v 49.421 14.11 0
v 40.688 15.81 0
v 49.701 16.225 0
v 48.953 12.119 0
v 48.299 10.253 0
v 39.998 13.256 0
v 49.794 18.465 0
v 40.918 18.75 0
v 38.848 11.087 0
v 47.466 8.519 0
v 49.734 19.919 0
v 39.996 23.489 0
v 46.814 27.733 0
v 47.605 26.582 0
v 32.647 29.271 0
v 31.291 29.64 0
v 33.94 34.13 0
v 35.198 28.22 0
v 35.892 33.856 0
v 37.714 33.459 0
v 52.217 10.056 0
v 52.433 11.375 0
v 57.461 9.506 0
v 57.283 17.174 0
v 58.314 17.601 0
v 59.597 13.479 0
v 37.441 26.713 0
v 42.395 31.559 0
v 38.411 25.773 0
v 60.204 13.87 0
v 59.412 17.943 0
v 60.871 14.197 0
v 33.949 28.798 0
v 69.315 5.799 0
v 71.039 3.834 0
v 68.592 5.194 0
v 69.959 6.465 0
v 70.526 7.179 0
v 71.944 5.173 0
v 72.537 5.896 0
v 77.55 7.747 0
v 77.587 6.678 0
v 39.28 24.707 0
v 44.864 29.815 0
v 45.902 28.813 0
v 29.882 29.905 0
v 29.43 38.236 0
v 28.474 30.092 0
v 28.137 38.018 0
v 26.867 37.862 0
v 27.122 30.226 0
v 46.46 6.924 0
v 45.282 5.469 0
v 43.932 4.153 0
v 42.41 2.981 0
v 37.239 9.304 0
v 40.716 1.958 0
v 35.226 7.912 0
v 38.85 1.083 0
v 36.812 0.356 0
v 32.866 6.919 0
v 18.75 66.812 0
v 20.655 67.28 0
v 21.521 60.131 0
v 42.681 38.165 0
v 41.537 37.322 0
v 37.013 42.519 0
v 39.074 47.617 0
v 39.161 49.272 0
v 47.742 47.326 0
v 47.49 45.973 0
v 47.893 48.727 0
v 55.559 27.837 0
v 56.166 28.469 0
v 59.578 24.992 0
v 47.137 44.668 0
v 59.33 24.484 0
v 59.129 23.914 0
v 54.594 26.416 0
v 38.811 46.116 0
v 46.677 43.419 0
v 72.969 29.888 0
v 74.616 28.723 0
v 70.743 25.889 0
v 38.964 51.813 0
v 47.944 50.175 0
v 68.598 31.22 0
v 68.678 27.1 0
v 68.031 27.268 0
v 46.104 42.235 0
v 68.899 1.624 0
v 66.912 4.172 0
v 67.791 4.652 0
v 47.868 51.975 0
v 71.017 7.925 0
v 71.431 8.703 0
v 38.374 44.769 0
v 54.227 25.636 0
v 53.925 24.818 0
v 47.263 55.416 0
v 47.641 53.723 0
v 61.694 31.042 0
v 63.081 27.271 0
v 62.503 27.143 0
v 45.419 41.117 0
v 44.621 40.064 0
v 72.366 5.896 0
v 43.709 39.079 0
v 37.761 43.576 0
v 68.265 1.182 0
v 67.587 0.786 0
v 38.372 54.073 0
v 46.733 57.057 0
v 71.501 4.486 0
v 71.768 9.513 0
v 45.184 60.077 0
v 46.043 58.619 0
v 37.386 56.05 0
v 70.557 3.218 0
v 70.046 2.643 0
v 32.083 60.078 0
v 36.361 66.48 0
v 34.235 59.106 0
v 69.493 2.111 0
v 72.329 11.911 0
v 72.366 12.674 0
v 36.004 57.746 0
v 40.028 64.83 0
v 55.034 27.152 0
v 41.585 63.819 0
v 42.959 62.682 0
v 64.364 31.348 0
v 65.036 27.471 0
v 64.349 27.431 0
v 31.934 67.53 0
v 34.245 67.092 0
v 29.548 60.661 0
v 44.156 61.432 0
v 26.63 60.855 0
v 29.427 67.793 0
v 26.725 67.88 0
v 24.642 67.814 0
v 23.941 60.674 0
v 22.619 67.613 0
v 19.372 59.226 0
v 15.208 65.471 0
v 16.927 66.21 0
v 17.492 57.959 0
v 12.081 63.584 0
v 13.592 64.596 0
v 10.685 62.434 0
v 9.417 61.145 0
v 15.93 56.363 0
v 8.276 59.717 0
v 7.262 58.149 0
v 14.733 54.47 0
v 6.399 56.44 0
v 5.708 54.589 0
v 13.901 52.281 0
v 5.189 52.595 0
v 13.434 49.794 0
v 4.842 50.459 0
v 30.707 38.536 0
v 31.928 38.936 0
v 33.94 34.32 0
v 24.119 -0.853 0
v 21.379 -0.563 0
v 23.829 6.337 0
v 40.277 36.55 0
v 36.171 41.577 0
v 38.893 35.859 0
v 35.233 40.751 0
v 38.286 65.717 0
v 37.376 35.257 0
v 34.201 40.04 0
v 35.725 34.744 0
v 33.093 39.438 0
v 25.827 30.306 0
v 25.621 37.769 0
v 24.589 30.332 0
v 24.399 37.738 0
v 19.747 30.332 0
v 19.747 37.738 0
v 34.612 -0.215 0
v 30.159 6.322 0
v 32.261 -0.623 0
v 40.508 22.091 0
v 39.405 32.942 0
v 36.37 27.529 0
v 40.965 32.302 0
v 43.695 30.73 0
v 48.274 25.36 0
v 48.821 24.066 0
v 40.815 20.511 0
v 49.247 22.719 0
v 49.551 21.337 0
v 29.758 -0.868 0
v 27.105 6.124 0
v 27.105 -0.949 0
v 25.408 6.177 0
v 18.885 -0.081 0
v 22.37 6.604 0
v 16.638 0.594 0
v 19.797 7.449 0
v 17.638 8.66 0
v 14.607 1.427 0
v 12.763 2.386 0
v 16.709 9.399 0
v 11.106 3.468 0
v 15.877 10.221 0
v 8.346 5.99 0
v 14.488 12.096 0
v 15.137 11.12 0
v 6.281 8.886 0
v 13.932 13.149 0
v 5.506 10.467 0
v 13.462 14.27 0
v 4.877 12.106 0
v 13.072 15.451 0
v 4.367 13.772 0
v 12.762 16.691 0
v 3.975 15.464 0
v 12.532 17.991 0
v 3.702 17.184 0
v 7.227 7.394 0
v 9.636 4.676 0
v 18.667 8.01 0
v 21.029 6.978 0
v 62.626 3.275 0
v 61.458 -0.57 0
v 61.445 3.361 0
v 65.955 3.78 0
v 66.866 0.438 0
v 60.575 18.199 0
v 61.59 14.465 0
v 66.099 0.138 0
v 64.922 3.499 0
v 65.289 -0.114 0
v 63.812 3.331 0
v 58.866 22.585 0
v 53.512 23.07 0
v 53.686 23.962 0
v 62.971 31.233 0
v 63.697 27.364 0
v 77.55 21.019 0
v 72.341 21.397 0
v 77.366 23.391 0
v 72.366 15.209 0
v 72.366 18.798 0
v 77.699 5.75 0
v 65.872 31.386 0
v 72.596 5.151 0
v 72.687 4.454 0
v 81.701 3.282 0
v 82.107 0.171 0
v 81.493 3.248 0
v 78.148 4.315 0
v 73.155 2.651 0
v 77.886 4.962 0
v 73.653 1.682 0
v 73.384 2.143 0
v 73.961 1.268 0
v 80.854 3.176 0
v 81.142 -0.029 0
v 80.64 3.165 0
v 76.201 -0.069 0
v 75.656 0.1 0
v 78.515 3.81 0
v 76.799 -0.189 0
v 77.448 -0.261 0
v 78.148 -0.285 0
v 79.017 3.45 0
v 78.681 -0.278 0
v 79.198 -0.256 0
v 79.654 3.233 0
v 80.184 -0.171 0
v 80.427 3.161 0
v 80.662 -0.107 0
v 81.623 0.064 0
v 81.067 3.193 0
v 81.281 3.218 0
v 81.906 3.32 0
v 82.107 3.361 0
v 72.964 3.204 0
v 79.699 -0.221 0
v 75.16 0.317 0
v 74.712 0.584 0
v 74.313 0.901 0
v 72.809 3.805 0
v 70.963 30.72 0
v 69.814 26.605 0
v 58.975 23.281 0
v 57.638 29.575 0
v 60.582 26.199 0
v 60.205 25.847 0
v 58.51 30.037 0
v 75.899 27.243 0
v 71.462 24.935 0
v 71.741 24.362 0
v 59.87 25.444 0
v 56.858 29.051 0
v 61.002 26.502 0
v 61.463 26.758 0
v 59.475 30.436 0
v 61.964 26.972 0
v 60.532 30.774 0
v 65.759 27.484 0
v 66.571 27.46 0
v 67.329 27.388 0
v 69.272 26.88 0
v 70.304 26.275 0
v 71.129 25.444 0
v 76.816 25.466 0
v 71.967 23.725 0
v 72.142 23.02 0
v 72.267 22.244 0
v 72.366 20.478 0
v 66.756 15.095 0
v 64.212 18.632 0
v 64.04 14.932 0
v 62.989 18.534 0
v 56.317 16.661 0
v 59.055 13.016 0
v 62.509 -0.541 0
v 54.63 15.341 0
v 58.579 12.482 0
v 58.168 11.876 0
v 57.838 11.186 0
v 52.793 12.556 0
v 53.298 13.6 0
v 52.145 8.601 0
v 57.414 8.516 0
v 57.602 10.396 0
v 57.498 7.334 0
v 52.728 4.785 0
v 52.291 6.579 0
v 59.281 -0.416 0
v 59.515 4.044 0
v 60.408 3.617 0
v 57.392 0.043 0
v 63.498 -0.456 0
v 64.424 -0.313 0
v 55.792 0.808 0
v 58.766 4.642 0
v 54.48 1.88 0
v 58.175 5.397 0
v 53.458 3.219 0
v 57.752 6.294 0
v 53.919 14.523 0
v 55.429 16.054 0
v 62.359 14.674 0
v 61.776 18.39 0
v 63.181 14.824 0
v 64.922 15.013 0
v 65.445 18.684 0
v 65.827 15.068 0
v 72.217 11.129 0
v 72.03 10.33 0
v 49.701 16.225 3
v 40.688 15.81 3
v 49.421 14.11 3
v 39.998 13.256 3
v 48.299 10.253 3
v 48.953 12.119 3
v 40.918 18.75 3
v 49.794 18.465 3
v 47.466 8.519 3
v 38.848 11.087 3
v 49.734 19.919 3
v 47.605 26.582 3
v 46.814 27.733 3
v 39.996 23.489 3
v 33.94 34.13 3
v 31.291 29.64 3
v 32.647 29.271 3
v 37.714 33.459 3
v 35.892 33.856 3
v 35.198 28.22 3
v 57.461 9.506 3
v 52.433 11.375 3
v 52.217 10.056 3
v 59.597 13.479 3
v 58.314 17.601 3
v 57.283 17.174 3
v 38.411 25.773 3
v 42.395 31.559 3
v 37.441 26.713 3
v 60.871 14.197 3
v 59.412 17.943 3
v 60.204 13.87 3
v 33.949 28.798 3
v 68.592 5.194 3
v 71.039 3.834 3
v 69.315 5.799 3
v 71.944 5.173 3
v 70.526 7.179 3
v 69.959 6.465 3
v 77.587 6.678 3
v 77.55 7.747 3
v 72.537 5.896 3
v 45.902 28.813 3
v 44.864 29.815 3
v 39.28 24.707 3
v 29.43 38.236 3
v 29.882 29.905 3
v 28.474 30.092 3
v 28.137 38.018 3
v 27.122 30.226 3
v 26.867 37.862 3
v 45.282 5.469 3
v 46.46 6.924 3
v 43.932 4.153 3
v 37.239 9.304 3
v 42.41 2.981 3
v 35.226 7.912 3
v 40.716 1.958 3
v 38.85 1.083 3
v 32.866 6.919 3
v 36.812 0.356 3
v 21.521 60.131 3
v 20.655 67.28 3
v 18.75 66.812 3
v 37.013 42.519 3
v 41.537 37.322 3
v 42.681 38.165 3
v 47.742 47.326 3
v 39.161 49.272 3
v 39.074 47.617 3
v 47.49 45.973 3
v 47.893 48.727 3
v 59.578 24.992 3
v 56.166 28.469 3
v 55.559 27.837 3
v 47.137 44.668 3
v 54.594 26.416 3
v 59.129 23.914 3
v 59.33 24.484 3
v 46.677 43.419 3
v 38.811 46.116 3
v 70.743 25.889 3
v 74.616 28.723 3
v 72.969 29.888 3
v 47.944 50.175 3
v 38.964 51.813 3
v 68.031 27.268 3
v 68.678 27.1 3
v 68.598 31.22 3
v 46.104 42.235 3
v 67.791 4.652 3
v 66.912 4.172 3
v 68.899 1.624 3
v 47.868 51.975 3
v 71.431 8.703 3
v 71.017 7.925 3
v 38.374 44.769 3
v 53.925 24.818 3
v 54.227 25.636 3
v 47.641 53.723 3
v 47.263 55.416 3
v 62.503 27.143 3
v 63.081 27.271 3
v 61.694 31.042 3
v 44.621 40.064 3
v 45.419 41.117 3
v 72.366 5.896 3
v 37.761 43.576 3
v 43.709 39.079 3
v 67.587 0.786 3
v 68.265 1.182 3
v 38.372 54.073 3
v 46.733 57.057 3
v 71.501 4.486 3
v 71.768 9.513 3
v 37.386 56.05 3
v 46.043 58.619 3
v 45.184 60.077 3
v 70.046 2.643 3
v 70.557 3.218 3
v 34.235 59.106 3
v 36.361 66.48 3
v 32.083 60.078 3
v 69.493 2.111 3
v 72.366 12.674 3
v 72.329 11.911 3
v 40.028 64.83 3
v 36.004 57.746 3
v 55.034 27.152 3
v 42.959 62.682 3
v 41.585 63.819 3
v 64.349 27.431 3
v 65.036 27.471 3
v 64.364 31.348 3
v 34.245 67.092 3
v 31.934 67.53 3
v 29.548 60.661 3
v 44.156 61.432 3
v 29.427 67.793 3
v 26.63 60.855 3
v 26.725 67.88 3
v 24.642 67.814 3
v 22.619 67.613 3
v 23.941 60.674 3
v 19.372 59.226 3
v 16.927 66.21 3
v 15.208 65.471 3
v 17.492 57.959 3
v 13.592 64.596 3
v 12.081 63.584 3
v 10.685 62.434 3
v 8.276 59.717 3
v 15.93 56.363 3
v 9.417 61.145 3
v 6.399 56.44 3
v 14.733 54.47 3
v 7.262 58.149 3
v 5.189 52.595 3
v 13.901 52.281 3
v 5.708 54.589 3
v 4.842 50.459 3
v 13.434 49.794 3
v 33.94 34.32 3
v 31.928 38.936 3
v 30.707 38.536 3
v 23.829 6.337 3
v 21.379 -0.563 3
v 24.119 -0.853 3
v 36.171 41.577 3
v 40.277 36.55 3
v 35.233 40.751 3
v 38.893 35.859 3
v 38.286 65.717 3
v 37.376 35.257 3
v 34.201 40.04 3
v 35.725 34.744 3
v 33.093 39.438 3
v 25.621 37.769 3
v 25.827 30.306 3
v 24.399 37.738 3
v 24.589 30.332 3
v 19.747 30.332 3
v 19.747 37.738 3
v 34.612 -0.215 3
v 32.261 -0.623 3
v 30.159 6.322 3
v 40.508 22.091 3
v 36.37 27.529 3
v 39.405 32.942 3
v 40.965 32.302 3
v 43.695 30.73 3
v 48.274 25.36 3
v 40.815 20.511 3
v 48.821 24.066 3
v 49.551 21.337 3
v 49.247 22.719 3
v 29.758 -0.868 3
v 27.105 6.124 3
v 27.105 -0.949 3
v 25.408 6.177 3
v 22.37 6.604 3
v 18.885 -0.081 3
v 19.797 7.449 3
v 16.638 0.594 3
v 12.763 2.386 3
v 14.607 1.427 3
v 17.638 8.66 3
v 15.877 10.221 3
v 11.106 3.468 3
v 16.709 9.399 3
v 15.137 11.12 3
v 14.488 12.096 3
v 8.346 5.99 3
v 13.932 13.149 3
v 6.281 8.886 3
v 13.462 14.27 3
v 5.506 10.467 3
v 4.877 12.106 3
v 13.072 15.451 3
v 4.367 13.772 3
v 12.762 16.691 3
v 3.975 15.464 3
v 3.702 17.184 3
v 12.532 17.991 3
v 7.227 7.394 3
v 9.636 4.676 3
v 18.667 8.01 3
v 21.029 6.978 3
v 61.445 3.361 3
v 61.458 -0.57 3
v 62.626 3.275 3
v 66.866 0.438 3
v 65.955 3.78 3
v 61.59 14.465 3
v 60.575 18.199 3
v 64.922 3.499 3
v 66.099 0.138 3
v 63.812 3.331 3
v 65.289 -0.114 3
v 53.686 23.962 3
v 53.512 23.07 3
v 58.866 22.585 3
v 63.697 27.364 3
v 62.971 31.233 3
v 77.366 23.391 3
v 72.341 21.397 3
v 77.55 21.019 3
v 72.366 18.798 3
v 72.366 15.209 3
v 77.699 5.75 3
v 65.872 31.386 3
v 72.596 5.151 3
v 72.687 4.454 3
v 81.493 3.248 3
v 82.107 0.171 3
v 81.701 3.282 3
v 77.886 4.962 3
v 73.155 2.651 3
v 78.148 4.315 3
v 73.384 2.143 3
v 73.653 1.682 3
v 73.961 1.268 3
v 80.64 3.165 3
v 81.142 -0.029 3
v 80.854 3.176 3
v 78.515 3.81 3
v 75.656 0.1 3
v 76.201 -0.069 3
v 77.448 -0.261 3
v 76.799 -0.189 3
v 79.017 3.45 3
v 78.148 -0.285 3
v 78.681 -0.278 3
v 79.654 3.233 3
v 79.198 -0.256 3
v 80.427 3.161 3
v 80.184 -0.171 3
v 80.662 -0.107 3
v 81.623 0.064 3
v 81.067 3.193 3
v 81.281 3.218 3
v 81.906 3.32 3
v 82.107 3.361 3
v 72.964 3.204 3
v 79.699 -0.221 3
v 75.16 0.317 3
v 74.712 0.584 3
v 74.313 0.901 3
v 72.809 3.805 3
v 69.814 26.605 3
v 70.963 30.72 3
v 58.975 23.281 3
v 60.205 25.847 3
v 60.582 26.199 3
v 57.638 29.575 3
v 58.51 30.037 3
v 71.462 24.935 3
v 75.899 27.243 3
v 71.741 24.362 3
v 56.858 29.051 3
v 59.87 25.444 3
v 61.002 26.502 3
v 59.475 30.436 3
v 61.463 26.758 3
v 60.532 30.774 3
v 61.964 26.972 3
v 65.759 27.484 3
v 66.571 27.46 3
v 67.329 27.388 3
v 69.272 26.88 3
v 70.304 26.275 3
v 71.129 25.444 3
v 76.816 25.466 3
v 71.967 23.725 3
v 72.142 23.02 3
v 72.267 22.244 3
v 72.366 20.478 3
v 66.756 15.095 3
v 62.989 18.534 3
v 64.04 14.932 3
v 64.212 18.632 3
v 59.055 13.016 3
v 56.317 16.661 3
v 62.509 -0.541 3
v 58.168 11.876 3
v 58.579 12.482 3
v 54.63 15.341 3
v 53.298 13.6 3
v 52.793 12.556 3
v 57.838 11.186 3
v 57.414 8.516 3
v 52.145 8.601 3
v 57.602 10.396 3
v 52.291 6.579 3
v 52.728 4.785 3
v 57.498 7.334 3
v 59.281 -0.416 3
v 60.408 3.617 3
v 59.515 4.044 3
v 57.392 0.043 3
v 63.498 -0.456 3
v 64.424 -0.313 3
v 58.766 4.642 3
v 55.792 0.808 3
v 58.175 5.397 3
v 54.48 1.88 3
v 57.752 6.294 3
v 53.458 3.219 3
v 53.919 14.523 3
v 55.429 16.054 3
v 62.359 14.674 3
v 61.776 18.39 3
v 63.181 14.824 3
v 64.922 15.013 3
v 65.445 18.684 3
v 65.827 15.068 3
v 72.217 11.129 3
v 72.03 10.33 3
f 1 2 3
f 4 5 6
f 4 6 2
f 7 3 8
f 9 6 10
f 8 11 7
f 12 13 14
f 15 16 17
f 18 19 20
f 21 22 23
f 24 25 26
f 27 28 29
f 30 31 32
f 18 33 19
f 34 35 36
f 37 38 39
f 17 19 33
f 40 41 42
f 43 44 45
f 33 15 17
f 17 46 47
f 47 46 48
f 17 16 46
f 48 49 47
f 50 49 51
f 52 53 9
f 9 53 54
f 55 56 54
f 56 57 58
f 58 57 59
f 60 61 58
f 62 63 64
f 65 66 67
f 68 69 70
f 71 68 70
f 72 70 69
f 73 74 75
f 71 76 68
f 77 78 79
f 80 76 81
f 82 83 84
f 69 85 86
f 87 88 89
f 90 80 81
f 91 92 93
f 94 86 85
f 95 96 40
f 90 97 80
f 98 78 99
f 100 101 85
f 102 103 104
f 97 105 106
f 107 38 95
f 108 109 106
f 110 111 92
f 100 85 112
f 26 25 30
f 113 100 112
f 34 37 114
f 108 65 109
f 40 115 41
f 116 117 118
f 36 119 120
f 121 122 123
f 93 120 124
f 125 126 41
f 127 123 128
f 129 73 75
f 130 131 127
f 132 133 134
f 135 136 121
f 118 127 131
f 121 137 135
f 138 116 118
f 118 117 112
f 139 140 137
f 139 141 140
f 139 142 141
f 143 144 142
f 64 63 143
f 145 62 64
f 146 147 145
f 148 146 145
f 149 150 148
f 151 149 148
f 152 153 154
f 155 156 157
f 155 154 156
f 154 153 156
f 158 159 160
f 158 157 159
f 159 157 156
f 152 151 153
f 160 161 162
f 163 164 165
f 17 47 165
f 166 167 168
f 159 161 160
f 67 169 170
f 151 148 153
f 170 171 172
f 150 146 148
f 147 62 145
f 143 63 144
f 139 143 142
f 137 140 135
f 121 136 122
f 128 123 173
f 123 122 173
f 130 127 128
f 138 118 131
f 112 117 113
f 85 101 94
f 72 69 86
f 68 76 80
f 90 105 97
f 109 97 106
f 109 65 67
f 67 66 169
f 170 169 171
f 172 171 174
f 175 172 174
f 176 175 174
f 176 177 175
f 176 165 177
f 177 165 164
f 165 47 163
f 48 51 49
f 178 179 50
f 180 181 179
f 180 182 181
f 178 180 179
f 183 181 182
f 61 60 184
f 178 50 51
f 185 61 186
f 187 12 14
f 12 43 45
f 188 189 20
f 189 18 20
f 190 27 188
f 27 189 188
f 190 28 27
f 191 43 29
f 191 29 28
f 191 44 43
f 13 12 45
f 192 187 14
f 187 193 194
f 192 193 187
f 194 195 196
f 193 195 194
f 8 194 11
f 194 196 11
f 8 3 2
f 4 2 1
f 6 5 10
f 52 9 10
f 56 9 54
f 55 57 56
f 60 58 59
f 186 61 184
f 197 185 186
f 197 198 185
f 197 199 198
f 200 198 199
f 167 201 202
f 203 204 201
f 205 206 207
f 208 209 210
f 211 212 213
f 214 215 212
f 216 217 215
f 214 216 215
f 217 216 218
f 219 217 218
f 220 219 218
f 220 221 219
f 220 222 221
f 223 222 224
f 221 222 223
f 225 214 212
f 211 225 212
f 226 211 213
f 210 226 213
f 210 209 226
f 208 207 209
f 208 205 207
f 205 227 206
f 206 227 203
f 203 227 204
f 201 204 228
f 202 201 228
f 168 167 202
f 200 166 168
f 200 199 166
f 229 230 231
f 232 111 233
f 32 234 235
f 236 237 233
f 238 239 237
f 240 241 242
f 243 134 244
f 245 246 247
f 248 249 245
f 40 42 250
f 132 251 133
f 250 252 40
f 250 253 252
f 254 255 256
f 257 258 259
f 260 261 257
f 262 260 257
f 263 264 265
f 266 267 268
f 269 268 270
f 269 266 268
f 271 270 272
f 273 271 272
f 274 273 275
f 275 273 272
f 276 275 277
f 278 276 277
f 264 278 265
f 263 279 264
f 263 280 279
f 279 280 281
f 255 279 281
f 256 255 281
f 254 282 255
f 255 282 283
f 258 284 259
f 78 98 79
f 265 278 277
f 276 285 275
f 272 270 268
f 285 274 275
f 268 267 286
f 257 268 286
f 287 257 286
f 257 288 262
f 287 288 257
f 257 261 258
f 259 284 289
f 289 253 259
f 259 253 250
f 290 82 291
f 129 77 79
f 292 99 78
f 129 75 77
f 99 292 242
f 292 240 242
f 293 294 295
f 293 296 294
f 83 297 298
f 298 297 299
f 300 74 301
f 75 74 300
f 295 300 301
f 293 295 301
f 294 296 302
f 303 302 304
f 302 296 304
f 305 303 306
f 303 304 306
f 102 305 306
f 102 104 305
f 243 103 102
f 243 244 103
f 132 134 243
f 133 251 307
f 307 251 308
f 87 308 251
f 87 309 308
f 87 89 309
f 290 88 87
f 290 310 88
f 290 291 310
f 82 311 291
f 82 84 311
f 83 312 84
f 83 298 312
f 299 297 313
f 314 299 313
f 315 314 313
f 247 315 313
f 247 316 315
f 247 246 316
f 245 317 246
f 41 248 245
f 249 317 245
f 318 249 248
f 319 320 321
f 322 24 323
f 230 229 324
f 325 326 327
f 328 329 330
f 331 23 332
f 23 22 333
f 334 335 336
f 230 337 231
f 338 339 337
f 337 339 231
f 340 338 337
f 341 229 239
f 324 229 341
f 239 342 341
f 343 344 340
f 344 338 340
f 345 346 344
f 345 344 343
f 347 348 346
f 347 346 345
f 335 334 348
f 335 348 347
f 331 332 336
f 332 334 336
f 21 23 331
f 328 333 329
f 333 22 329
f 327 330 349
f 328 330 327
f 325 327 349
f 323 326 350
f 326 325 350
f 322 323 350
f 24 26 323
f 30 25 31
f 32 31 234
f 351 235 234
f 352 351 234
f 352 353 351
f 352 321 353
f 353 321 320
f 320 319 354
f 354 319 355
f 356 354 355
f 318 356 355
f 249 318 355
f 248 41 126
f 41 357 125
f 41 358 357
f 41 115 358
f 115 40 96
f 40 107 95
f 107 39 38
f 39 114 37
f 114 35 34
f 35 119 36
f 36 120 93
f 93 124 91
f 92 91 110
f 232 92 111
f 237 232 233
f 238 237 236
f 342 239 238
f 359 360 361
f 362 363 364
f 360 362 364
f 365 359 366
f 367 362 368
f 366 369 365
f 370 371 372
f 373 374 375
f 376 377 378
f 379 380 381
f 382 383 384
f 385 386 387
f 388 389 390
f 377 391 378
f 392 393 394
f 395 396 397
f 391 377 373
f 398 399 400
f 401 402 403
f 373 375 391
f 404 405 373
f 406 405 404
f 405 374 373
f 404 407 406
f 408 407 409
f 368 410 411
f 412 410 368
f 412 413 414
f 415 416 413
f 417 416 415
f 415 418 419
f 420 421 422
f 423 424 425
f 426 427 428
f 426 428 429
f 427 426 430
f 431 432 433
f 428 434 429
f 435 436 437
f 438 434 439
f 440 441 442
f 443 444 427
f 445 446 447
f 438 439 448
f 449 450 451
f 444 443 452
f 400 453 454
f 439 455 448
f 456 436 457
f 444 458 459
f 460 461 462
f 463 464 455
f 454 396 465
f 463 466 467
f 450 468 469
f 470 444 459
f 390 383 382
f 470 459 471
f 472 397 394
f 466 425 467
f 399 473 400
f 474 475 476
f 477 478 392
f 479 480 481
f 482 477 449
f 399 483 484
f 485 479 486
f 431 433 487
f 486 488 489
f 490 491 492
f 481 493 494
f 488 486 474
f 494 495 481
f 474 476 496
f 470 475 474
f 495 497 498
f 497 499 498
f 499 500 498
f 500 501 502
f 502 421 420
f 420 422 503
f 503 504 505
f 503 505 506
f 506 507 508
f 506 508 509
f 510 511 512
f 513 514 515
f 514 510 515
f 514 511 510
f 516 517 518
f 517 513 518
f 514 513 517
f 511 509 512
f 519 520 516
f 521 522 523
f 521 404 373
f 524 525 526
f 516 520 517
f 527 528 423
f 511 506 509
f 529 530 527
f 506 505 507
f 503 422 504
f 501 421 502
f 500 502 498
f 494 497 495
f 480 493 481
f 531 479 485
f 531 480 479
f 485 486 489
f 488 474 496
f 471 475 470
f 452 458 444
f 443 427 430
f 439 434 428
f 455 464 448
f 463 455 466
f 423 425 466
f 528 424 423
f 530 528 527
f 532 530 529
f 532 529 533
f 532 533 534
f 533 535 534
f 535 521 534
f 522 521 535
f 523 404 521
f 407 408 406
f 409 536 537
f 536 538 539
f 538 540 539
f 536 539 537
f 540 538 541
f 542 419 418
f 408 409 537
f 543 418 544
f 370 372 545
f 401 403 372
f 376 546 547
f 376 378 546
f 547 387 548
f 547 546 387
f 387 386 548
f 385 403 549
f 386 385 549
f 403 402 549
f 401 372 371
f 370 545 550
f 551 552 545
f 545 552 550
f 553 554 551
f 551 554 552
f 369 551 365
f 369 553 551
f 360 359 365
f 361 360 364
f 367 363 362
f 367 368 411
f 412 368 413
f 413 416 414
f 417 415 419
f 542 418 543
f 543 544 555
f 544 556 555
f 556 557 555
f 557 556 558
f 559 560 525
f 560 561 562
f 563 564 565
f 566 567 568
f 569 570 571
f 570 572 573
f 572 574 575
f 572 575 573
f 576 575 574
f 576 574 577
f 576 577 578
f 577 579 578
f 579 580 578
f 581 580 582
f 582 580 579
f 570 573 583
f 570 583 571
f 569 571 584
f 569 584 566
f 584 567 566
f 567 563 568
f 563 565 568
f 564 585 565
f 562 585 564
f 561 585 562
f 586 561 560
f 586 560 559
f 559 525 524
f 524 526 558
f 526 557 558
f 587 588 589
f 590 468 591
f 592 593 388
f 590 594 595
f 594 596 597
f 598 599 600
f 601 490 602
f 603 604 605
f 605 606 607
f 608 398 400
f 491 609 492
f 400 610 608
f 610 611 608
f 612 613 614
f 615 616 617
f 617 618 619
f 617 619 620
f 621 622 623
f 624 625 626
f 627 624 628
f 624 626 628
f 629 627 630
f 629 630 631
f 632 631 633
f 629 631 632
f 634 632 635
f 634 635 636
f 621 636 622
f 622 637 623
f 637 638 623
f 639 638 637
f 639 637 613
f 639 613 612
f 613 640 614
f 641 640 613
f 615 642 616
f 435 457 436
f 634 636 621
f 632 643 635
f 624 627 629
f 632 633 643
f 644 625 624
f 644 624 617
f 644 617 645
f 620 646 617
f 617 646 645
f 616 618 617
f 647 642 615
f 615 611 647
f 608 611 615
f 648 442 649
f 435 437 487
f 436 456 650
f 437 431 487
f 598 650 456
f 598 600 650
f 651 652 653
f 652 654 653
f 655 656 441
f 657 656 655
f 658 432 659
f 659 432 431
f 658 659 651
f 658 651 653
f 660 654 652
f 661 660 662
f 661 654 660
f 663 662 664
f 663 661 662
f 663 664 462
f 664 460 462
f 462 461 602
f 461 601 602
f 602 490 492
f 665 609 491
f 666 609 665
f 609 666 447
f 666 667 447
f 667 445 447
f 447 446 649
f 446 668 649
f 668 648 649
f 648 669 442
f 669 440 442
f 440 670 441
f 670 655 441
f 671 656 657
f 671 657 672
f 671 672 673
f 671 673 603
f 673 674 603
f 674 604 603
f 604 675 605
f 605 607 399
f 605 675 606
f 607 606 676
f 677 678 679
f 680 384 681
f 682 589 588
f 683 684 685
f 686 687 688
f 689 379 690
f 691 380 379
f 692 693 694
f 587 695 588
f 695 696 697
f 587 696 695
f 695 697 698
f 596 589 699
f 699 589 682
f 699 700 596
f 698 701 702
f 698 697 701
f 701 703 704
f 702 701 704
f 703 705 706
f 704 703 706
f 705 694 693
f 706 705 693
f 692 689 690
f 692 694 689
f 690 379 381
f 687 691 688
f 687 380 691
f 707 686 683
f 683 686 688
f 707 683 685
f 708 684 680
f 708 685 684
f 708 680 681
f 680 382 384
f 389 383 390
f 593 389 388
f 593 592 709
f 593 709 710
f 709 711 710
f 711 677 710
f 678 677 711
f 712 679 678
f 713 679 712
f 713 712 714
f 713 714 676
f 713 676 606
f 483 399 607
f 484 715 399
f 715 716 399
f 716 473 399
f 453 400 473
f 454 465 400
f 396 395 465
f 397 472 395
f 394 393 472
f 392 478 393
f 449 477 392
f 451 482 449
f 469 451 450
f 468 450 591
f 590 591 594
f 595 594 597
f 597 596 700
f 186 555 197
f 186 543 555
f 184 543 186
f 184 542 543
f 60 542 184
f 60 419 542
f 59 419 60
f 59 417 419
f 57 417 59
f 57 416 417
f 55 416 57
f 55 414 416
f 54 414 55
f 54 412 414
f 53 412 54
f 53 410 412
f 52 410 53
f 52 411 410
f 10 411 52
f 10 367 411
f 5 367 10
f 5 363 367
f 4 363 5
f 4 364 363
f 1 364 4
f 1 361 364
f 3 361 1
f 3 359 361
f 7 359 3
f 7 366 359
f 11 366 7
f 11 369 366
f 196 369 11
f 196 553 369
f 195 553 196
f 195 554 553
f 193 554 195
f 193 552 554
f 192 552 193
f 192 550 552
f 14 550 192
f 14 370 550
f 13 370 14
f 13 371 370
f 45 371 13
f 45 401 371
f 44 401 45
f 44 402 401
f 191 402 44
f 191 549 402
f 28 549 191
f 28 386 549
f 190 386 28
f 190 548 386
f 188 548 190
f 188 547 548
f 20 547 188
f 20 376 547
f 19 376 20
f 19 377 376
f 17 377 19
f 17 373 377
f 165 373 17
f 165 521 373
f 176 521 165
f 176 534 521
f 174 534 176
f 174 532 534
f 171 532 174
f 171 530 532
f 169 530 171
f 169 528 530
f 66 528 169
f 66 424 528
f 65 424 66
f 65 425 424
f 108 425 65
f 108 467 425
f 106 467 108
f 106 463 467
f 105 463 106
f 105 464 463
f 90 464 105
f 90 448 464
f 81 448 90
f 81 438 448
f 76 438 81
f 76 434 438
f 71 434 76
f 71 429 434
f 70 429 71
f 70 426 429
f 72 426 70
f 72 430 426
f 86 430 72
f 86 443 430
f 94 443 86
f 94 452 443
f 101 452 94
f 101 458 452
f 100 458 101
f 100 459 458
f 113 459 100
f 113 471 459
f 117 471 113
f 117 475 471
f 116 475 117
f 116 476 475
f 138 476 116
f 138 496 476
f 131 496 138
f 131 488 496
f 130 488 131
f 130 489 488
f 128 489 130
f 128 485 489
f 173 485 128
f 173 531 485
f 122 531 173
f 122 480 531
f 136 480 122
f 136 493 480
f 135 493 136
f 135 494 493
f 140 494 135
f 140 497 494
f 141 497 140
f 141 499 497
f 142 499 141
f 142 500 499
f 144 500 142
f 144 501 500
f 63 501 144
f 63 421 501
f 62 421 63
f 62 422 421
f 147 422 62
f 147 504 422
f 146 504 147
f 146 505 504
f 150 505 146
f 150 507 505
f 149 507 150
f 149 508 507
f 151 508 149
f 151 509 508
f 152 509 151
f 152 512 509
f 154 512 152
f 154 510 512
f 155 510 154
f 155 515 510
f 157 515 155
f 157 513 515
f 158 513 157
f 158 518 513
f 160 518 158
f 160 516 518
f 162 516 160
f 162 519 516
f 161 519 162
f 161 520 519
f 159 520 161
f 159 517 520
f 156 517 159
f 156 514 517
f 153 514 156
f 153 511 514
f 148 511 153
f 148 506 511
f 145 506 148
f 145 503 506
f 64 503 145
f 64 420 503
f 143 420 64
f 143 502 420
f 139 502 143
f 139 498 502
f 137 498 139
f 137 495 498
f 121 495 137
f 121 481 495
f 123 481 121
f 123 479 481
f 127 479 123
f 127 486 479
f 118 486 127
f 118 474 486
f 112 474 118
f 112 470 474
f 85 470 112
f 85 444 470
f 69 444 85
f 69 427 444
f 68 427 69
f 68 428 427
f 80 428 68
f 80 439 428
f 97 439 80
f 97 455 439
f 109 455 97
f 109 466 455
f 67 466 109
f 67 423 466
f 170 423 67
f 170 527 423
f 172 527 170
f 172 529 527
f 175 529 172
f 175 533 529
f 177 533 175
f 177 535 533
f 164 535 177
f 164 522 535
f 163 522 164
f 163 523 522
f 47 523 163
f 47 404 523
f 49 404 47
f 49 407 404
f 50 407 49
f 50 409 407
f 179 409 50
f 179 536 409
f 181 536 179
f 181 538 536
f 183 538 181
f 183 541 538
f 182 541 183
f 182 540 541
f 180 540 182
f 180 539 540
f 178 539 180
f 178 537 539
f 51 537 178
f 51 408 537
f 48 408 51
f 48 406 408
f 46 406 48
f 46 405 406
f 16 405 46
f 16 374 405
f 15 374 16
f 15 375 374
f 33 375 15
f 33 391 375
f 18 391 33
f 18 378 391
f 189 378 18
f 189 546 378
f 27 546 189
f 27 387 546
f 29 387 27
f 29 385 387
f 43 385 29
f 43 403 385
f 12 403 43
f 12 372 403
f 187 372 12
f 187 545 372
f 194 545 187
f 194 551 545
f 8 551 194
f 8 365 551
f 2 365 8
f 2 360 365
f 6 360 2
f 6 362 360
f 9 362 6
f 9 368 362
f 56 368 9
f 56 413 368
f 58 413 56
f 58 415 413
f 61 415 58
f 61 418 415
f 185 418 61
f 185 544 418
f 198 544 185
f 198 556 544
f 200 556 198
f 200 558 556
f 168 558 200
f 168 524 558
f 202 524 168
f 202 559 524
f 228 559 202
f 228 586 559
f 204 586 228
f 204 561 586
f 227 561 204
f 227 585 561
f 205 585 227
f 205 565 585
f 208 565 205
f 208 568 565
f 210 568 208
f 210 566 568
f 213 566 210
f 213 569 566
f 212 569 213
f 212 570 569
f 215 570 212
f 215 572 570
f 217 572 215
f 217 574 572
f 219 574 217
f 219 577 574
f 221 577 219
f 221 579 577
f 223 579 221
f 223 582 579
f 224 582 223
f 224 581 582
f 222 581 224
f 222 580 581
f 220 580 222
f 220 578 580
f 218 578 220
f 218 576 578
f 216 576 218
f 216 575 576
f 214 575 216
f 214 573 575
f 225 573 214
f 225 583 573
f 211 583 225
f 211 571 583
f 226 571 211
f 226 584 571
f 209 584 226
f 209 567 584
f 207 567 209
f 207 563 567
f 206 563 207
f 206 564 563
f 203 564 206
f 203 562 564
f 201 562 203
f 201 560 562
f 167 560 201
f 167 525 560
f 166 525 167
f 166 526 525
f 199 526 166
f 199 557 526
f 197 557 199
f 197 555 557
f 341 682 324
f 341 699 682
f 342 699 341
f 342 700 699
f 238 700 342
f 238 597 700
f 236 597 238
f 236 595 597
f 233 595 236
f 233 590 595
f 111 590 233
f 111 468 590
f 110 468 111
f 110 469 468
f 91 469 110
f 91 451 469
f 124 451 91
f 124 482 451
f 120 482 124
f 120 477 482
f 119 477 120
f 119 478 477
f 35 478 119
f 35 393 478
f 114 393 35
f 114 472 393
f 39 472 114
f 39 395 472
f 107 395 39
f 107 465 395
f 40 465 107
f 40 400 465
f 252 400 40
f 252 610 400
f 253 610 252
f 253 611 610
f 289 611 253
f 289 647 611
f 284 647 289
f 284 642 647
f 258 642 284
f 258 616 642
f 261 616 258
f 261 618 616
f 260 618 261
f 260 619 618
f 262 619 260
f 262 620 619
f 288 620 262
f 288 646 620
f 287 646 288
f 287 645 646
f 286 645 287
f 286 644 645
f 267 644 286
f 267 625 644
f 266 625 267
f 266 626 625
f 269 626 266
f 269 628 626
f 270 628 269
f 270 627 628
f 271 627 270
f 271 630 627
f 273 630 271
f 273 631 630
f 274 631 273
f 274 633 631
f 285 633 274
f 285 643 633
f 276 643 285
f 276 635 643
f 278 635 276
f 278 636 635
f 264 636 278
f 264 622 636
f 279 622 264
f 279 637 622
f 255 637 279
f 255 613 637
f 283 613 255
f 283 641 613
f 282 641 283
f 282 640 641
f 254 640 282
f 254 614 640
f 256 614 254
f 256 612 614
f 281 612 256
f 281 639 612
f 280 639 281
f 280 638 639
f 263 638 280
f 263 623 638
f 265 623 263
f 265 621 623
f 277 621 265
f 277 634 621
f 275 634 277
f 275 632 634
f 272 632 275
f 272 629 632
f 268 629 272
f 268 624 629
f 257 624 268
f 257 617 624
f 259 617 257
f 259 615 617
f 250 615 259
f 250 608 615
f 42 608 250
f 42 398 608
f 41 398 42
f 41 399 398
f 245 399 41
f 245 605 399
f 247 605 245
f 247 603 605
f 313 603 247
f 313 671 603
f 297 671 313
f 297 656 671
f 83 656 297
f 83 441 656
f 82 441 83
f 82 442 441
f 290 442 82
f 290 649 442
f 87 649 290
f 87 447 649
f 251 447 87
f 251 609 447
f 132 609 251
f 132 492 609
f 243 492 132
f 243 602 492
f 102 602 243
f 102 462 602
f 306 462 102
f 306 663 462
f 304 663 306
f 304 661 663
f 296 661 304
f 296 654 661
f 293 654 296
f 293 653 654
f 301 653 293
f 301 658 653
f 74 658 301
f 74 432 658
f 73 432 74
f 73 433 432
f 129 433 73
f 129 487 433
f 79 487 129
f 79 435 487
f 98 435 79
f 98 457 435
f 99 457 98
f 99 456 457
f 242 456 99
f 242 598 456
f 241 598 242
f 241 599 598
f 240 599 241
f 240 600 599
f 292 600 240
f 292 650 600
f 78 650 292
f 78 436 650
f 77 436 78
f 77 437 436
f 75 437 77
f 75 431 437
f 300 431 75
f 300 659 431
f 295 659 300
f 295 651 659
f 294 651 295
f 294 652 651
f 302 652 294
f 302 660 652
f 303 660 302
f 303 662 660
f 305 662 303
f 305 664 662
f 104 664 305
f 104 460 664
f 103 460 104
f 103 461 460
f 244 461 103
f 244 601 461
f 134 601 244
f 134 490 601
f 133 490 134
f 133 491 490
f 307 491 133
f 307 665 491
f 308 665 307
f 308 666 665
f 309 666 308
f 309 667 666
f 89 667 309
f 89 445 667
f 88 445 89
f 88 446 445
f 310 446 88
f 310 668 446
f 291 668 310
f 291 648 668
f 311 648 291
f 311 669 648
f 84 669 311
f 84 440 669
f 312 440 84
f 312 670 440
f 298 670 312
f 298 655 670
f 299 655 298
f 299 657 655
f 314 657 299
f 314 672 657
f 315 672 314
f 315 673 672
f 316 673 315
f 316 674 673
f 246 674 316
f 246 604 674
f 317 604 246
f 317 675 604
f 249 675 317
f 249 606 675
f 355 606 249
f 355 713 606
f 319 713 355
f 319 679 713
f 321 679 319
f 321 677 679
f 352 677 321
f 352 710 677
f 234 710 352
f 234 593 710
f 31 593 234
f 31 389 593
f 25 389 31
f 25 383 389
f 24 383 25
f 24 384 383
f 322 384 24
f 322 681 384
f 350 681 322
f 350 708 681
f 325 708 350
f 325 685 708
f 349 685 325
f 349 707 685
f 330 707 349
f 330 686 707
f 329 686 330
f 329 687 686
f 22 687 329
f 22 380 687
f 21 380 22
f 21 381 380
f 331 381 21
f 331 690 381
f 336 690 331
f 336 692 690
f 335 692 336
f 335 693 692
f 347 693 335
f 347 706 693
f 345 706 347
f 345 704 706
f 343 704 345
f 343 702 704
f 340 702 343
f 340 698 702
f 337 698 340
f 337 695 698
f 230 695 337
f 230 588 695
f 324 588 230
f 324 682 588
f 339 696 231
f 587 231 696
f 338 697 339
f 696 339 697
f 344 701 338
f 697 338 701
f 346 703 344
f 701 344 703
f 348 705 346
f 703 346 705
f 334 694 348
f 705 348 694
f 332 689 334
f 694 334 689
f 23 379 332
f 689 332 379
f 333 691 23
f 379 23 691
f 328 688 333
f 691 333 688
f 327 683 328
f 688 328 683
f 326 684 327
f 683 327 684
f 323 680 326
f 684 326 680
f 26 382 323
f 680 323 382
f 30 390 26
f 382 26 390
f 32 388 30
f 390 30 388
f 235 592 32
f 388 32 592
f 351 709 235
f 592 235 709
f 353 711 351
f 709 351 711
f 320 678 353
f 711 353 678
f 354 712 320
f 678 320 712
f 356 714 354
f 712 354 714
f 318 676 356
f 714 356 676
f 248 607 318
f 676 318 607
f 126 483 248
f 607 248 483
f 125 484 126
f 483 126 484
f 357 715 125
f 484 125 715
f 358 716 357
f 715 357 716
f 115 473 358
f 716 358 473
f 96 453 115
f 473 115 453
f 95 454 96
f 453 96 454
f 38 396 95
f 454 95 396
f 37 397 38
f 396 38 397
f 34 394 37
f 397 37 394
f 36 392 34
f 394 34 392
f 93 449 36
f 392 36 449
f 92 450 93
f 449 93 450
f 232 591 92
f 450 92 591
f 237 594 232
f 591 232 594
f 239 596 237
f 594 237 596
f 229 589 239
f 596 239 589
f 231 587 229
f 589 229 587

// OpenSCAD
/**
 * Hausnummer 3a
 */

numberHeight=70;
numberWidth=numberHeight*2/3;
letterHeight=numberHeight*3/5;

color("black")
    linear_extrude(height = 3) 
{
    translate([0,0,0]) text("3", ,size=numberHeight,halign="left");
    translate([numberWidth+3,0,0]) text("a", ,size=letterHeight,halign="left");
}
